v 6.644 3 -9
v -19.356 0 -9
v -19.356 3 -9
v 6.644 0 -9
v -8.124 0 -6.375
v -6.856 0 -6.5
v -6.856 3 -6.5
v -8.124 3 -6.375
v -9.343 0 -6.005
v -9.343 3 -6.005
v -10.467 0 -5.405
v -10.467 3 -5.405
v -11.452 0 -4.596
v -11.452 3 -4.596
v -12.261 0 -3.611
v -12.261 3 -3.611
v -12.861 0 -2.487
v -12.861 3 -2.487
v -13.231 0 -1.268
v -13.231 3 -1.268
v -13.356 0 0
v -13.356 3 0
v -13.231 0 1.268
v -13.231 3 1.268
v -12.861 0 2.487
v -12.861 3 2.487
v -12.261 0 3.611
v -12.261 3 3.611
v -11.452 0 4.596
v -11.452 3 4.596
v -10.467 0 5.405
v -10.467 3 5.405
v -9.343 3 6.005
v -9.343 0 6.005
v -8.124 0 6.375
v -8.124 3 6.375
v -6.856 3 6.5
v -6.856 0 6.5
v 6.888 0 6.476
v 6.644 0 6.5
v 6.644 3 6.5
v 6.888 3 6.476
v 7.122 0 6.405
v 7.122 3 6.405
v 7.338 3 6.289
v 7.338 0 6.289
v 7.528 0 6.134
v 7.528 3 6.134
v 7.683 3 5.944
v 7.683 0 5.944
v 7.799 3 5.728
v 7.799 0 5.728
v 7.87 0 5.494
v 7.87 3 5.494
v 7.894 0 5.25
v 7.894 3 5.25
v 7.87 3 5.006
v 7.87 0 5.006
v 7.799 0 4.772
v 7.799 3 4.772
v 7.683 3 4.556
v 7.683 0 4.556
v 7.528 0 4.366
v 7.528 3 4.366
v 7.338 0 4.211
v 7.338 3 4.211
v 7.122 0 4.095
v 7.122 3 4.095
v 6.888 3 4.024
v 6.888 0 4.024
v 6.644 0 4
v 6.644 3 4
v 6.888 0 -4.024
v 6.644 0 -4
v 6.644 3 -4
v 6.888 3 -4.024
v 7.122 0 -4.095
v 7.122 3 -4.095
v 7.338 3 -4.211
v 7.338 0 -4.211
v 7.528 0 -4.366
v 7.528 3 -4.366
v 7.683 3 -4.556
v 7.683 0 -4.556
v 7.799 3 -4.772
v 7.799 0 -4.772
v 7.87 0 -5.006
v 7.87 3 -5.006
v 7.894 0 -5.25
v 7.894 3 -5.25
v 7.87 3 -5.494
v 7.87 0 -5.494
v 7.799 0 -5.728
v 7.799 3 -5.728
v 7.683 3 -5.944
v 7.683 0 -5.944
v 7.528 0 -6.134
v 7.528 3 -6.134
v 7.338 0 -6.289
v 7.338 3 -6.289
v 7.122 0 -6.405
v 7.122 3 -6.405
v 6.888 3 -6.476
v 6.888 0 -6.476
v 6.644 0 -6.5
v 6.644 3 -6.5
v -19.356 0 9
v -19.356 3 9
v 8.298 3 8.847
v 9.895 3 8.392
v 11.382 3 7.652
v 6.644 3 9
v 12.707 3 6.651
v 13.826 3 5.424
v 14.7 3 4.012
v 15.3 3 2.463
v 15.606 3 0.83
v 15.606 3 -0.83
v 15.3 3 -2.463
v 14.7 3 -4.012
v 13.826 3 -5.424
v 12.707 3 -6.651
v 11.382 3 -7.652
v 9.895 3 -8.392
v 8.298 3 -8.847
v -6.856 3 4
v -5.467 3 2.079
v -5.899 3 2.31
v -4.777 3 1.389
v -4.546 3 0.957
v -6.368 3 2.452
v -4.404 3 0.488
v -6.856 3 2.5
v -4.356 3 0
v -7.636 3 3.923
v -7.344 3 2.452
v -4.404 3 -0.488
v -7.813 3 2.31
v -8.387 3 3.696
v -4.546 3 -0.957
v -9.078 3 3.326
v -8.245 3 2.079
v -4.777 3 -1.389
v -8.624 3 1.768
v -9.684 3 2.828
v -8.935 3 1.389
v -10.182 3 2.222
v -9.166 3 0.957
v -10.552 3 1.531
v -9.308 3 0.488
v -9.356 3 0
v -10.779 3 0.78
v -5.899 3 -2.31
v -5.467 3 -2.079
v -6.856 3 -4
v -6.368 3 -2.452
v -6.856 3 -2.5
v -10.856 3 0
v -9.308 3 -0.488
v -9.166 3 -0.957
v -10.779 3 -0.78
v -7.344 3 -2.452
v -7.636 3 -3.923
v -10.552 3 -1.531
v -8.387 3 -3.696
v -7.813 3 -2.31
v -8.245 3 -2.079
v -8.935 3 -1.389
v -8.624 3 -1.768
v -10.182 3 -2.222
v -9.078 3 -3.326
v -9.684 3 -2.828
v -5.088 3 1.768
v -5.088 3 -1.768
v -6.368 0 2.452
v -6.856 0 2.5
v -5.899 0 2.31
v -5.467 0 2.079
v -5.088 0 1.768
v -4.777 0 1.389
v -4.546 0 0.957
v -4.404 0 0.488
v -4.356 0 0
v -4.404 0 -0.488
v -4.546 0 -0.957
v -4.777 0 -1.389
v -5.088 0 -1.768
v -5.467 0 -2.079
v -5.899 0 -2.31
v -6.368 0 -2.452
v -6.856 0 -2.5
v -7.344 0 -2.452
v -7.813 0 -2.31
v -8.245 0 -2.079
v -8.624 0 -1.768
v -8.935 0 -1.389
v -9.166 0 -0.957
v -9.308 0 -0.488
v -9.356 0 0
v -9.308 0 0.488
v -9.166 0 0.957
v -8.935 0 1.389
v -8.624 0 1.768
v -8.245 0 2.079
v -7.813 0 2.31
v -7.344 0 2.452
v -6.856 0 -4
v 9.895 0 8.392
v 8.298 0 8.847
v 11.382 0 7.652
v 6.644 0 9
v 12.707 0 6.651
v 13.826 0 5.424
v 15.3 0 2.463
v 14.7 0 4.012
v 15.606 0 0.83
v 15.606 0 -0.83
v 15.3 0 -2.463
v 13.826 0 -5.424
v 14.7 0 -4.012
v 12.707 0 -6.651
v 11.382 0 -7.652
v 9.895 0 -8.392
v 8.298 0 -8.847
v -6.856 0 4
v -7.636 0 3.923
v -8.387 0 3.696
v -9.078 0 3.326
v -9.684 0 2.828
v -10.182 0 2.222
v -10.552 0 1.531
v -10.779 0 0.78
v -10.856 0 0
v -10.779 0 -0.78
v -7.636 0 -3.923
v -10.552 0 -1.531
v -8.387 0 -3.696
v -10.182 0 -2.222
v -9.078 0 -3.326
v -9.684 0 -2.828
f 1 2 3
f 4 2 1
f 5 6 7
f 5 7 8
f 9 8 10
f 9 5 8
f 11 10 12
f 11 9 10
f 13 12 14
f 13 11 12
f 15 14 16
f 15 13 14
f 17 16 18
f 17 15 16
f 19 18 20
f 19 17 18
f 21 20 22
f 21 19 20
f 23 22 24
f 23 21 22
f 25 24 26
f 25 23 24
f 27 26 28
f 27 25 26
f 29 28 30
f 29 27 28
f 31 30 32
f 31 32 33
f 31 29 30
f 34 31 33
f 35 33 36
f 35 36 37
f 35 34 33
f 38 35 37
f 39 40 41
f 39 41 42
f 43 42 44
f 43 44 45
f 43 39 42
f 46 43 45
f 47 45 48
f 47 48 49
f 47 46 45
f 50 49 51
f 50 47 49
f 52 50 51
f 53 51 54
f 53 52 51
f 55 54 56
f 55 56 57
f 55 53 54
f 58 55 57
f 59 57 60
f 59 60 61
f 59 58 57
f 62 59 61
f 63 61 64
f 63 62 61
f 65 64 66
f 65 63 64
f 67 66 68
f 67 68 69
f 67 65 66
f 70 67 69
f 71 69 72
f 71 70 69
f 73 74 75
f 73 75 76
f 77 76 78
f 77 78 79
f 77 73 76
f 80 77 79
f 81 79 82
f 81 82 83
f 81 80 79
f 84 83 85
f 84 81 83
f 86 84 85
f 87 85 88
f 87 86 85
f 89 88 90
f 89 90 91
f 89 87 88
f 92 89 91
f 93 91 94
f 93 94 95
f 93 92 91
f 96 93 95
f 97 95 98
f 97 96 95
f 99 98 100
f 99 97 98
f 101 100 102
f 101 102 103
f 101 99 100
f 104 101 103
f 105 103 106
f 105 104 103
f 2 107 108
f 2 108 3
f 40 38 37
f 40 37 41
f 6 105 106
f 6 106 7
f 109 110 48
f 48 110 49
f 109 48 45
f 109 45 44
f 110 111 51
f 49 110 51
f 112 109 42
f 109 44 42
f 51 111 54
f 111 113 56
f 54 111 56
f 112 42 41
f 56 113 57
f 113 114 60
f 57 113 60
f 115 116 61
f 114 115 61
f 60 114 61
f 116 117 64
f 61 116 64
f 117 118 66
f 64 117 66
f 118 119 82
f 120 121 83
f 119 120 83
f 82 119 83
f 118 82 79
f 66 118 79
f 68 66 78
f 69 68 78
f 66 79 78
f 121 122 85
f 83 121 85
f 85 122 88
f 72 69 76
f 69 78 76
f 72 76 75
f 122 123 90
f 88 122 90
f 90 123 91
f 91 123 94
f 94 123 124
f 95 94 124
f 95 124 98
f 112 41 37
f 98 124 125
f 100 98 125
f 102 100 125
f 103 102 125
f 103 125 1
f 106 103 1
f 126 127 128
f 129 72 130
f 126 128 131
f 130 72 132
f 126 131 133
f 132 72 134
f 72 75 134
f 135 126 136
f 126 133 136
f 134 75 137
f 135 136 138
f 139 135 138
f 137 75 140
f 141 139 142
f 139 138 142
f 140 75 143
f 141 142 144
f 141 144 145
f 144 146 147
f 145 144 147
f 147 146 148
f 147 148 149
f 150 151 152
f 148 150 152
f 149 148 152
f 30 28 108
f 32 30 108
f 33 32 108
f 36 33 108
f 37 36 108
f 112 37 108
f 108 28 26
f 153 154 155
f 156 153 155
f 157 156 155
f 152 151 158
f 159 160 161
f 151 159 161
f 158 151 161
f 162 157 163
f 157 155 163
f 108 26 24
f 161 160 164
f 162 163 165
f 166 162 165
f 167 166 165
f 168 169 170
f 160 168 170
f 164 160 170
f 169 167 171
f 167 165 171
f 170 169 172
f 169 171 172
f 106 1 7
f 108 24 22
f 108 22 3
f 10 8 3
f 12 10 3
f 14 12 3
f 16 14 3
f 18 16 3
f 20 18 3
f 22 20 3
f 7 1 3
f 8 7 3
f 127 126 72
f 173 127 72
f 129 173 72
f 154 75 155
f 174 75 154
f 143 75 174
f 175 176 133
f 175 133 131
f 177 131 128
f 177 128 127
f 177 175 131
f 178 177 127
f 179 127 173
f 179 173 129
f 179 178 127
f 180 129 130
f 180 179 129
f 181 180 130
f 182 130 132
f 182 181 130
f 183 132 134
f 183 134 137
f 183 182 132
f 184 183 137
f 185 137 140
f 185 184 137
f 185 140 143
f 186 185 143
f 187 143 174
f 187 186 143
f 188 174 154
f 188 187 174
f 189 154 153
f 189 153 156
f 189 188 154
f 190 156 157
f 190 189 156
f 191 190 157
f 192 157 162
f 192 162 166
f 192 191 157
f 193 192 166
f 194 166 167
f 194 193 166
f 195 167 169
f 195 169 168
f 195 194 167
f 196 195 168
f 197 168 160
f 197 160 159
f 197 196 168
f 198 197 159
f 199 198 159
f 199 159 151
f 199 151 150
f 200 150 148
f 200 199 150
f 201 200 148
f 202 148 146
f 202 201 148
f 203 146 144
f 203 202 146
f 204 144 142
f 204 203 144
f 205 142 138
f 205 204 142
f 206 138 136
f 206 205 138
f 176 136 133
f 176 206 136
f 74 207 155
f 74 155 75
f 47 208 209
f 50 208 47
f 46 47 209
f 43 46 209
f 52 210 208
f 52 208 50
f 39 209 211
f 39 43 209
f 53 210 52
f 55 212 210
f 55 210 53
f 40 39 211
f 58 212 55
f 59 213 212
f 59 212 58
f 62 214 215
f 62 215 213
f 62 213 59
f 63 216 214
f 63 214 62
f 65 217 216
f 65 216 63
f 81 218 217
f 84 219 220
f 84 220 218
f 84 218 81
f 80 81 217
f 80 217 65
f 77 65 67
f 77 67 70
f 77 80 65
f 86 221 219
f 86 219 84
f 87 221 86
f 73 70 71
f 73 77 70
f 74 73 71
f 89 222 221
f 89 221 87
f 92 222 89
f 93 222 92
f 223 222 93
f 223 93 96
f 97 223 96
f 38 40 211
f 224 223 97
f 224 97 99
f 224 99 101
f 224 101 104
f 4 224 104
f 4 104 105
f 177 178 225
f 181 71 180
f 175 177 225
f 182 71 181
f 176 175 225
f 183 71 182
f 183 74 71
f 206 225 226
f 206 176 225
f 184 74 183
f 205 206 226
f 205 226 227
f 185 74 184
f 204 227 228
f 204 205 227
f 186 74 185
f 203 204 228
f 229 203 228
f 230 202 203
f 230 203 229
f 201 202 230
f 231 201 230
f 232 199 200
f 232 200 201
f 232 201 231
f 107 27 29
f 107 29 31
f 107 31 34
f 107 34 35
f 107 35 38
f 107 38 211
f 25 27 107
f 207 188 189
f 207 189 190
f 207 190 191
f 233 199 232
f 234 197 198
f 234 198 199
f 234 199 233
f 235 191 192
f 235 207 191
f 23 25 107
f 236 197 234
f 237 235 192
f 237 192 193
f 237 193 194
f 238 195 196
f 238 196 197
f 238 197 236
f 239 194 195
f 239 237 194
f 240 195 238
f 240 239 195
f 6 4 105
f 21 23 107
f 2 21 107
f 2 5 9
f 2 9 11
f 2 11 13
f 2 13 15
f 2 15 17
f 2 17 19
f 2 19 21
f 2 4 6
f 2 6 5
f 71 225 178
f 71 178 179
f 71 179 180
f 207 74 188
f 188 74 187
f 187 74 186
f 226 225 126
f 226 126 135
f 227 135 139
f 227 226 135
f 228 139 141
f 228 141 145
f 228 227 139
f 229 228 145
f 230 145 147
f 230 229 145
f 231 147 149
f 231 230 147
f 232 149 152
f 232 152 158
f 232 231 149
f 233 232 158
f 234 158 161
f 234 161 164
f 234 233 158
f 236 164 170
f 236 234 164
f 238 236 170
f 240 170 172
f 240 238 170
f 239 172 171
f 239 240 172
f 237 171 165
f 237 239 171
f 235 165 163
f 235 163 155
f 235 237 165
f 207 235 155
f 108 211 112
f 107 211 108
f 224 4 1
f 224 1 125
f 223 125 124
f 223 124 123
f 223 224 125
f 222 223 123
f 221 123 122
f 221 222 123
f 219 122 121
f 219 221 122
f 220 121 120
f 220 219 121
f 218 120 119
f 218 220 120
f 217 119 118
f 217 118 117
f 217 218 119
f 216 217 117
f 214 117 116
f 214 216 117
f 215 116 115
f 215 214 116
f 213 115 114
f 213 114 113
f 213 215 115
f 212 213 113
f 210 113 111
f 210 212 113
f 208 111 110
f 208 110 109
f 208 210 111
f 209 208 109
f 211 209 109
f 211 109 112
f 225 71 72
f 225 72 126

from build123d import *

# Parameters (mm, degrees)
SKETCH1_R           = 2.5
BOSS_EXTRUDE2_DEPTH = 3


with BuildPart() as part:
    # Sketch1 → Boss-Extrude2 (new body)
    with BuildSketch(Plane(origin=(0, 0, 0), x_dir=(1, 0, 0), z_dir=(0, 1, 0))):
        with BuildLine():
            Line((-19.356020942, 9), (6.643979058, 9))
            ThreePointArc((6.643979058, 9), (15.643979058, 0), (6.643979058, -9))
            Line((6.643979058, -9), (-19.356020942, -9))
            Line((-19.356020942, -9), (-19.356020942, 9))
        make_face()
        with Locations(Location((-6.856020942, 0, 0), (0, 0, 270))):
            Circle(SKETCH1_R, mode=Mode.SUBTRACT)
        with BuildLine():
            Line((-6.856020942, -6.5), (6.643979058, -6.5))
            ThreePointArc((6.643979058, -6.5), (7.893979058, -5.25), (6.643979058, -4))
            Line((6.643979058, -4), (-6.856020942, -4))
            ThreePointArc((-6.856020942, -4), (-10.856020942, 0), (-6.856020942, 4))
            Line((-6.856020942, 4), (6.643979058, 4))
            ThreePointArc((6.643979058, 4), (7.893979058, 5.25), (6.643979058, 6.5))
            Line((6.643979058, 6.5), (-6.856020942, 6.5))
            ThreePointArc((-6.856020942, 6.5), (-13.356020942, 0), (-6.856020942, -6.5))
        make_face(mode=Mode.SUBTRACT)
    extrude(amount=BOSS_EXTRUDE2_DEPTH)


solid = part.part
